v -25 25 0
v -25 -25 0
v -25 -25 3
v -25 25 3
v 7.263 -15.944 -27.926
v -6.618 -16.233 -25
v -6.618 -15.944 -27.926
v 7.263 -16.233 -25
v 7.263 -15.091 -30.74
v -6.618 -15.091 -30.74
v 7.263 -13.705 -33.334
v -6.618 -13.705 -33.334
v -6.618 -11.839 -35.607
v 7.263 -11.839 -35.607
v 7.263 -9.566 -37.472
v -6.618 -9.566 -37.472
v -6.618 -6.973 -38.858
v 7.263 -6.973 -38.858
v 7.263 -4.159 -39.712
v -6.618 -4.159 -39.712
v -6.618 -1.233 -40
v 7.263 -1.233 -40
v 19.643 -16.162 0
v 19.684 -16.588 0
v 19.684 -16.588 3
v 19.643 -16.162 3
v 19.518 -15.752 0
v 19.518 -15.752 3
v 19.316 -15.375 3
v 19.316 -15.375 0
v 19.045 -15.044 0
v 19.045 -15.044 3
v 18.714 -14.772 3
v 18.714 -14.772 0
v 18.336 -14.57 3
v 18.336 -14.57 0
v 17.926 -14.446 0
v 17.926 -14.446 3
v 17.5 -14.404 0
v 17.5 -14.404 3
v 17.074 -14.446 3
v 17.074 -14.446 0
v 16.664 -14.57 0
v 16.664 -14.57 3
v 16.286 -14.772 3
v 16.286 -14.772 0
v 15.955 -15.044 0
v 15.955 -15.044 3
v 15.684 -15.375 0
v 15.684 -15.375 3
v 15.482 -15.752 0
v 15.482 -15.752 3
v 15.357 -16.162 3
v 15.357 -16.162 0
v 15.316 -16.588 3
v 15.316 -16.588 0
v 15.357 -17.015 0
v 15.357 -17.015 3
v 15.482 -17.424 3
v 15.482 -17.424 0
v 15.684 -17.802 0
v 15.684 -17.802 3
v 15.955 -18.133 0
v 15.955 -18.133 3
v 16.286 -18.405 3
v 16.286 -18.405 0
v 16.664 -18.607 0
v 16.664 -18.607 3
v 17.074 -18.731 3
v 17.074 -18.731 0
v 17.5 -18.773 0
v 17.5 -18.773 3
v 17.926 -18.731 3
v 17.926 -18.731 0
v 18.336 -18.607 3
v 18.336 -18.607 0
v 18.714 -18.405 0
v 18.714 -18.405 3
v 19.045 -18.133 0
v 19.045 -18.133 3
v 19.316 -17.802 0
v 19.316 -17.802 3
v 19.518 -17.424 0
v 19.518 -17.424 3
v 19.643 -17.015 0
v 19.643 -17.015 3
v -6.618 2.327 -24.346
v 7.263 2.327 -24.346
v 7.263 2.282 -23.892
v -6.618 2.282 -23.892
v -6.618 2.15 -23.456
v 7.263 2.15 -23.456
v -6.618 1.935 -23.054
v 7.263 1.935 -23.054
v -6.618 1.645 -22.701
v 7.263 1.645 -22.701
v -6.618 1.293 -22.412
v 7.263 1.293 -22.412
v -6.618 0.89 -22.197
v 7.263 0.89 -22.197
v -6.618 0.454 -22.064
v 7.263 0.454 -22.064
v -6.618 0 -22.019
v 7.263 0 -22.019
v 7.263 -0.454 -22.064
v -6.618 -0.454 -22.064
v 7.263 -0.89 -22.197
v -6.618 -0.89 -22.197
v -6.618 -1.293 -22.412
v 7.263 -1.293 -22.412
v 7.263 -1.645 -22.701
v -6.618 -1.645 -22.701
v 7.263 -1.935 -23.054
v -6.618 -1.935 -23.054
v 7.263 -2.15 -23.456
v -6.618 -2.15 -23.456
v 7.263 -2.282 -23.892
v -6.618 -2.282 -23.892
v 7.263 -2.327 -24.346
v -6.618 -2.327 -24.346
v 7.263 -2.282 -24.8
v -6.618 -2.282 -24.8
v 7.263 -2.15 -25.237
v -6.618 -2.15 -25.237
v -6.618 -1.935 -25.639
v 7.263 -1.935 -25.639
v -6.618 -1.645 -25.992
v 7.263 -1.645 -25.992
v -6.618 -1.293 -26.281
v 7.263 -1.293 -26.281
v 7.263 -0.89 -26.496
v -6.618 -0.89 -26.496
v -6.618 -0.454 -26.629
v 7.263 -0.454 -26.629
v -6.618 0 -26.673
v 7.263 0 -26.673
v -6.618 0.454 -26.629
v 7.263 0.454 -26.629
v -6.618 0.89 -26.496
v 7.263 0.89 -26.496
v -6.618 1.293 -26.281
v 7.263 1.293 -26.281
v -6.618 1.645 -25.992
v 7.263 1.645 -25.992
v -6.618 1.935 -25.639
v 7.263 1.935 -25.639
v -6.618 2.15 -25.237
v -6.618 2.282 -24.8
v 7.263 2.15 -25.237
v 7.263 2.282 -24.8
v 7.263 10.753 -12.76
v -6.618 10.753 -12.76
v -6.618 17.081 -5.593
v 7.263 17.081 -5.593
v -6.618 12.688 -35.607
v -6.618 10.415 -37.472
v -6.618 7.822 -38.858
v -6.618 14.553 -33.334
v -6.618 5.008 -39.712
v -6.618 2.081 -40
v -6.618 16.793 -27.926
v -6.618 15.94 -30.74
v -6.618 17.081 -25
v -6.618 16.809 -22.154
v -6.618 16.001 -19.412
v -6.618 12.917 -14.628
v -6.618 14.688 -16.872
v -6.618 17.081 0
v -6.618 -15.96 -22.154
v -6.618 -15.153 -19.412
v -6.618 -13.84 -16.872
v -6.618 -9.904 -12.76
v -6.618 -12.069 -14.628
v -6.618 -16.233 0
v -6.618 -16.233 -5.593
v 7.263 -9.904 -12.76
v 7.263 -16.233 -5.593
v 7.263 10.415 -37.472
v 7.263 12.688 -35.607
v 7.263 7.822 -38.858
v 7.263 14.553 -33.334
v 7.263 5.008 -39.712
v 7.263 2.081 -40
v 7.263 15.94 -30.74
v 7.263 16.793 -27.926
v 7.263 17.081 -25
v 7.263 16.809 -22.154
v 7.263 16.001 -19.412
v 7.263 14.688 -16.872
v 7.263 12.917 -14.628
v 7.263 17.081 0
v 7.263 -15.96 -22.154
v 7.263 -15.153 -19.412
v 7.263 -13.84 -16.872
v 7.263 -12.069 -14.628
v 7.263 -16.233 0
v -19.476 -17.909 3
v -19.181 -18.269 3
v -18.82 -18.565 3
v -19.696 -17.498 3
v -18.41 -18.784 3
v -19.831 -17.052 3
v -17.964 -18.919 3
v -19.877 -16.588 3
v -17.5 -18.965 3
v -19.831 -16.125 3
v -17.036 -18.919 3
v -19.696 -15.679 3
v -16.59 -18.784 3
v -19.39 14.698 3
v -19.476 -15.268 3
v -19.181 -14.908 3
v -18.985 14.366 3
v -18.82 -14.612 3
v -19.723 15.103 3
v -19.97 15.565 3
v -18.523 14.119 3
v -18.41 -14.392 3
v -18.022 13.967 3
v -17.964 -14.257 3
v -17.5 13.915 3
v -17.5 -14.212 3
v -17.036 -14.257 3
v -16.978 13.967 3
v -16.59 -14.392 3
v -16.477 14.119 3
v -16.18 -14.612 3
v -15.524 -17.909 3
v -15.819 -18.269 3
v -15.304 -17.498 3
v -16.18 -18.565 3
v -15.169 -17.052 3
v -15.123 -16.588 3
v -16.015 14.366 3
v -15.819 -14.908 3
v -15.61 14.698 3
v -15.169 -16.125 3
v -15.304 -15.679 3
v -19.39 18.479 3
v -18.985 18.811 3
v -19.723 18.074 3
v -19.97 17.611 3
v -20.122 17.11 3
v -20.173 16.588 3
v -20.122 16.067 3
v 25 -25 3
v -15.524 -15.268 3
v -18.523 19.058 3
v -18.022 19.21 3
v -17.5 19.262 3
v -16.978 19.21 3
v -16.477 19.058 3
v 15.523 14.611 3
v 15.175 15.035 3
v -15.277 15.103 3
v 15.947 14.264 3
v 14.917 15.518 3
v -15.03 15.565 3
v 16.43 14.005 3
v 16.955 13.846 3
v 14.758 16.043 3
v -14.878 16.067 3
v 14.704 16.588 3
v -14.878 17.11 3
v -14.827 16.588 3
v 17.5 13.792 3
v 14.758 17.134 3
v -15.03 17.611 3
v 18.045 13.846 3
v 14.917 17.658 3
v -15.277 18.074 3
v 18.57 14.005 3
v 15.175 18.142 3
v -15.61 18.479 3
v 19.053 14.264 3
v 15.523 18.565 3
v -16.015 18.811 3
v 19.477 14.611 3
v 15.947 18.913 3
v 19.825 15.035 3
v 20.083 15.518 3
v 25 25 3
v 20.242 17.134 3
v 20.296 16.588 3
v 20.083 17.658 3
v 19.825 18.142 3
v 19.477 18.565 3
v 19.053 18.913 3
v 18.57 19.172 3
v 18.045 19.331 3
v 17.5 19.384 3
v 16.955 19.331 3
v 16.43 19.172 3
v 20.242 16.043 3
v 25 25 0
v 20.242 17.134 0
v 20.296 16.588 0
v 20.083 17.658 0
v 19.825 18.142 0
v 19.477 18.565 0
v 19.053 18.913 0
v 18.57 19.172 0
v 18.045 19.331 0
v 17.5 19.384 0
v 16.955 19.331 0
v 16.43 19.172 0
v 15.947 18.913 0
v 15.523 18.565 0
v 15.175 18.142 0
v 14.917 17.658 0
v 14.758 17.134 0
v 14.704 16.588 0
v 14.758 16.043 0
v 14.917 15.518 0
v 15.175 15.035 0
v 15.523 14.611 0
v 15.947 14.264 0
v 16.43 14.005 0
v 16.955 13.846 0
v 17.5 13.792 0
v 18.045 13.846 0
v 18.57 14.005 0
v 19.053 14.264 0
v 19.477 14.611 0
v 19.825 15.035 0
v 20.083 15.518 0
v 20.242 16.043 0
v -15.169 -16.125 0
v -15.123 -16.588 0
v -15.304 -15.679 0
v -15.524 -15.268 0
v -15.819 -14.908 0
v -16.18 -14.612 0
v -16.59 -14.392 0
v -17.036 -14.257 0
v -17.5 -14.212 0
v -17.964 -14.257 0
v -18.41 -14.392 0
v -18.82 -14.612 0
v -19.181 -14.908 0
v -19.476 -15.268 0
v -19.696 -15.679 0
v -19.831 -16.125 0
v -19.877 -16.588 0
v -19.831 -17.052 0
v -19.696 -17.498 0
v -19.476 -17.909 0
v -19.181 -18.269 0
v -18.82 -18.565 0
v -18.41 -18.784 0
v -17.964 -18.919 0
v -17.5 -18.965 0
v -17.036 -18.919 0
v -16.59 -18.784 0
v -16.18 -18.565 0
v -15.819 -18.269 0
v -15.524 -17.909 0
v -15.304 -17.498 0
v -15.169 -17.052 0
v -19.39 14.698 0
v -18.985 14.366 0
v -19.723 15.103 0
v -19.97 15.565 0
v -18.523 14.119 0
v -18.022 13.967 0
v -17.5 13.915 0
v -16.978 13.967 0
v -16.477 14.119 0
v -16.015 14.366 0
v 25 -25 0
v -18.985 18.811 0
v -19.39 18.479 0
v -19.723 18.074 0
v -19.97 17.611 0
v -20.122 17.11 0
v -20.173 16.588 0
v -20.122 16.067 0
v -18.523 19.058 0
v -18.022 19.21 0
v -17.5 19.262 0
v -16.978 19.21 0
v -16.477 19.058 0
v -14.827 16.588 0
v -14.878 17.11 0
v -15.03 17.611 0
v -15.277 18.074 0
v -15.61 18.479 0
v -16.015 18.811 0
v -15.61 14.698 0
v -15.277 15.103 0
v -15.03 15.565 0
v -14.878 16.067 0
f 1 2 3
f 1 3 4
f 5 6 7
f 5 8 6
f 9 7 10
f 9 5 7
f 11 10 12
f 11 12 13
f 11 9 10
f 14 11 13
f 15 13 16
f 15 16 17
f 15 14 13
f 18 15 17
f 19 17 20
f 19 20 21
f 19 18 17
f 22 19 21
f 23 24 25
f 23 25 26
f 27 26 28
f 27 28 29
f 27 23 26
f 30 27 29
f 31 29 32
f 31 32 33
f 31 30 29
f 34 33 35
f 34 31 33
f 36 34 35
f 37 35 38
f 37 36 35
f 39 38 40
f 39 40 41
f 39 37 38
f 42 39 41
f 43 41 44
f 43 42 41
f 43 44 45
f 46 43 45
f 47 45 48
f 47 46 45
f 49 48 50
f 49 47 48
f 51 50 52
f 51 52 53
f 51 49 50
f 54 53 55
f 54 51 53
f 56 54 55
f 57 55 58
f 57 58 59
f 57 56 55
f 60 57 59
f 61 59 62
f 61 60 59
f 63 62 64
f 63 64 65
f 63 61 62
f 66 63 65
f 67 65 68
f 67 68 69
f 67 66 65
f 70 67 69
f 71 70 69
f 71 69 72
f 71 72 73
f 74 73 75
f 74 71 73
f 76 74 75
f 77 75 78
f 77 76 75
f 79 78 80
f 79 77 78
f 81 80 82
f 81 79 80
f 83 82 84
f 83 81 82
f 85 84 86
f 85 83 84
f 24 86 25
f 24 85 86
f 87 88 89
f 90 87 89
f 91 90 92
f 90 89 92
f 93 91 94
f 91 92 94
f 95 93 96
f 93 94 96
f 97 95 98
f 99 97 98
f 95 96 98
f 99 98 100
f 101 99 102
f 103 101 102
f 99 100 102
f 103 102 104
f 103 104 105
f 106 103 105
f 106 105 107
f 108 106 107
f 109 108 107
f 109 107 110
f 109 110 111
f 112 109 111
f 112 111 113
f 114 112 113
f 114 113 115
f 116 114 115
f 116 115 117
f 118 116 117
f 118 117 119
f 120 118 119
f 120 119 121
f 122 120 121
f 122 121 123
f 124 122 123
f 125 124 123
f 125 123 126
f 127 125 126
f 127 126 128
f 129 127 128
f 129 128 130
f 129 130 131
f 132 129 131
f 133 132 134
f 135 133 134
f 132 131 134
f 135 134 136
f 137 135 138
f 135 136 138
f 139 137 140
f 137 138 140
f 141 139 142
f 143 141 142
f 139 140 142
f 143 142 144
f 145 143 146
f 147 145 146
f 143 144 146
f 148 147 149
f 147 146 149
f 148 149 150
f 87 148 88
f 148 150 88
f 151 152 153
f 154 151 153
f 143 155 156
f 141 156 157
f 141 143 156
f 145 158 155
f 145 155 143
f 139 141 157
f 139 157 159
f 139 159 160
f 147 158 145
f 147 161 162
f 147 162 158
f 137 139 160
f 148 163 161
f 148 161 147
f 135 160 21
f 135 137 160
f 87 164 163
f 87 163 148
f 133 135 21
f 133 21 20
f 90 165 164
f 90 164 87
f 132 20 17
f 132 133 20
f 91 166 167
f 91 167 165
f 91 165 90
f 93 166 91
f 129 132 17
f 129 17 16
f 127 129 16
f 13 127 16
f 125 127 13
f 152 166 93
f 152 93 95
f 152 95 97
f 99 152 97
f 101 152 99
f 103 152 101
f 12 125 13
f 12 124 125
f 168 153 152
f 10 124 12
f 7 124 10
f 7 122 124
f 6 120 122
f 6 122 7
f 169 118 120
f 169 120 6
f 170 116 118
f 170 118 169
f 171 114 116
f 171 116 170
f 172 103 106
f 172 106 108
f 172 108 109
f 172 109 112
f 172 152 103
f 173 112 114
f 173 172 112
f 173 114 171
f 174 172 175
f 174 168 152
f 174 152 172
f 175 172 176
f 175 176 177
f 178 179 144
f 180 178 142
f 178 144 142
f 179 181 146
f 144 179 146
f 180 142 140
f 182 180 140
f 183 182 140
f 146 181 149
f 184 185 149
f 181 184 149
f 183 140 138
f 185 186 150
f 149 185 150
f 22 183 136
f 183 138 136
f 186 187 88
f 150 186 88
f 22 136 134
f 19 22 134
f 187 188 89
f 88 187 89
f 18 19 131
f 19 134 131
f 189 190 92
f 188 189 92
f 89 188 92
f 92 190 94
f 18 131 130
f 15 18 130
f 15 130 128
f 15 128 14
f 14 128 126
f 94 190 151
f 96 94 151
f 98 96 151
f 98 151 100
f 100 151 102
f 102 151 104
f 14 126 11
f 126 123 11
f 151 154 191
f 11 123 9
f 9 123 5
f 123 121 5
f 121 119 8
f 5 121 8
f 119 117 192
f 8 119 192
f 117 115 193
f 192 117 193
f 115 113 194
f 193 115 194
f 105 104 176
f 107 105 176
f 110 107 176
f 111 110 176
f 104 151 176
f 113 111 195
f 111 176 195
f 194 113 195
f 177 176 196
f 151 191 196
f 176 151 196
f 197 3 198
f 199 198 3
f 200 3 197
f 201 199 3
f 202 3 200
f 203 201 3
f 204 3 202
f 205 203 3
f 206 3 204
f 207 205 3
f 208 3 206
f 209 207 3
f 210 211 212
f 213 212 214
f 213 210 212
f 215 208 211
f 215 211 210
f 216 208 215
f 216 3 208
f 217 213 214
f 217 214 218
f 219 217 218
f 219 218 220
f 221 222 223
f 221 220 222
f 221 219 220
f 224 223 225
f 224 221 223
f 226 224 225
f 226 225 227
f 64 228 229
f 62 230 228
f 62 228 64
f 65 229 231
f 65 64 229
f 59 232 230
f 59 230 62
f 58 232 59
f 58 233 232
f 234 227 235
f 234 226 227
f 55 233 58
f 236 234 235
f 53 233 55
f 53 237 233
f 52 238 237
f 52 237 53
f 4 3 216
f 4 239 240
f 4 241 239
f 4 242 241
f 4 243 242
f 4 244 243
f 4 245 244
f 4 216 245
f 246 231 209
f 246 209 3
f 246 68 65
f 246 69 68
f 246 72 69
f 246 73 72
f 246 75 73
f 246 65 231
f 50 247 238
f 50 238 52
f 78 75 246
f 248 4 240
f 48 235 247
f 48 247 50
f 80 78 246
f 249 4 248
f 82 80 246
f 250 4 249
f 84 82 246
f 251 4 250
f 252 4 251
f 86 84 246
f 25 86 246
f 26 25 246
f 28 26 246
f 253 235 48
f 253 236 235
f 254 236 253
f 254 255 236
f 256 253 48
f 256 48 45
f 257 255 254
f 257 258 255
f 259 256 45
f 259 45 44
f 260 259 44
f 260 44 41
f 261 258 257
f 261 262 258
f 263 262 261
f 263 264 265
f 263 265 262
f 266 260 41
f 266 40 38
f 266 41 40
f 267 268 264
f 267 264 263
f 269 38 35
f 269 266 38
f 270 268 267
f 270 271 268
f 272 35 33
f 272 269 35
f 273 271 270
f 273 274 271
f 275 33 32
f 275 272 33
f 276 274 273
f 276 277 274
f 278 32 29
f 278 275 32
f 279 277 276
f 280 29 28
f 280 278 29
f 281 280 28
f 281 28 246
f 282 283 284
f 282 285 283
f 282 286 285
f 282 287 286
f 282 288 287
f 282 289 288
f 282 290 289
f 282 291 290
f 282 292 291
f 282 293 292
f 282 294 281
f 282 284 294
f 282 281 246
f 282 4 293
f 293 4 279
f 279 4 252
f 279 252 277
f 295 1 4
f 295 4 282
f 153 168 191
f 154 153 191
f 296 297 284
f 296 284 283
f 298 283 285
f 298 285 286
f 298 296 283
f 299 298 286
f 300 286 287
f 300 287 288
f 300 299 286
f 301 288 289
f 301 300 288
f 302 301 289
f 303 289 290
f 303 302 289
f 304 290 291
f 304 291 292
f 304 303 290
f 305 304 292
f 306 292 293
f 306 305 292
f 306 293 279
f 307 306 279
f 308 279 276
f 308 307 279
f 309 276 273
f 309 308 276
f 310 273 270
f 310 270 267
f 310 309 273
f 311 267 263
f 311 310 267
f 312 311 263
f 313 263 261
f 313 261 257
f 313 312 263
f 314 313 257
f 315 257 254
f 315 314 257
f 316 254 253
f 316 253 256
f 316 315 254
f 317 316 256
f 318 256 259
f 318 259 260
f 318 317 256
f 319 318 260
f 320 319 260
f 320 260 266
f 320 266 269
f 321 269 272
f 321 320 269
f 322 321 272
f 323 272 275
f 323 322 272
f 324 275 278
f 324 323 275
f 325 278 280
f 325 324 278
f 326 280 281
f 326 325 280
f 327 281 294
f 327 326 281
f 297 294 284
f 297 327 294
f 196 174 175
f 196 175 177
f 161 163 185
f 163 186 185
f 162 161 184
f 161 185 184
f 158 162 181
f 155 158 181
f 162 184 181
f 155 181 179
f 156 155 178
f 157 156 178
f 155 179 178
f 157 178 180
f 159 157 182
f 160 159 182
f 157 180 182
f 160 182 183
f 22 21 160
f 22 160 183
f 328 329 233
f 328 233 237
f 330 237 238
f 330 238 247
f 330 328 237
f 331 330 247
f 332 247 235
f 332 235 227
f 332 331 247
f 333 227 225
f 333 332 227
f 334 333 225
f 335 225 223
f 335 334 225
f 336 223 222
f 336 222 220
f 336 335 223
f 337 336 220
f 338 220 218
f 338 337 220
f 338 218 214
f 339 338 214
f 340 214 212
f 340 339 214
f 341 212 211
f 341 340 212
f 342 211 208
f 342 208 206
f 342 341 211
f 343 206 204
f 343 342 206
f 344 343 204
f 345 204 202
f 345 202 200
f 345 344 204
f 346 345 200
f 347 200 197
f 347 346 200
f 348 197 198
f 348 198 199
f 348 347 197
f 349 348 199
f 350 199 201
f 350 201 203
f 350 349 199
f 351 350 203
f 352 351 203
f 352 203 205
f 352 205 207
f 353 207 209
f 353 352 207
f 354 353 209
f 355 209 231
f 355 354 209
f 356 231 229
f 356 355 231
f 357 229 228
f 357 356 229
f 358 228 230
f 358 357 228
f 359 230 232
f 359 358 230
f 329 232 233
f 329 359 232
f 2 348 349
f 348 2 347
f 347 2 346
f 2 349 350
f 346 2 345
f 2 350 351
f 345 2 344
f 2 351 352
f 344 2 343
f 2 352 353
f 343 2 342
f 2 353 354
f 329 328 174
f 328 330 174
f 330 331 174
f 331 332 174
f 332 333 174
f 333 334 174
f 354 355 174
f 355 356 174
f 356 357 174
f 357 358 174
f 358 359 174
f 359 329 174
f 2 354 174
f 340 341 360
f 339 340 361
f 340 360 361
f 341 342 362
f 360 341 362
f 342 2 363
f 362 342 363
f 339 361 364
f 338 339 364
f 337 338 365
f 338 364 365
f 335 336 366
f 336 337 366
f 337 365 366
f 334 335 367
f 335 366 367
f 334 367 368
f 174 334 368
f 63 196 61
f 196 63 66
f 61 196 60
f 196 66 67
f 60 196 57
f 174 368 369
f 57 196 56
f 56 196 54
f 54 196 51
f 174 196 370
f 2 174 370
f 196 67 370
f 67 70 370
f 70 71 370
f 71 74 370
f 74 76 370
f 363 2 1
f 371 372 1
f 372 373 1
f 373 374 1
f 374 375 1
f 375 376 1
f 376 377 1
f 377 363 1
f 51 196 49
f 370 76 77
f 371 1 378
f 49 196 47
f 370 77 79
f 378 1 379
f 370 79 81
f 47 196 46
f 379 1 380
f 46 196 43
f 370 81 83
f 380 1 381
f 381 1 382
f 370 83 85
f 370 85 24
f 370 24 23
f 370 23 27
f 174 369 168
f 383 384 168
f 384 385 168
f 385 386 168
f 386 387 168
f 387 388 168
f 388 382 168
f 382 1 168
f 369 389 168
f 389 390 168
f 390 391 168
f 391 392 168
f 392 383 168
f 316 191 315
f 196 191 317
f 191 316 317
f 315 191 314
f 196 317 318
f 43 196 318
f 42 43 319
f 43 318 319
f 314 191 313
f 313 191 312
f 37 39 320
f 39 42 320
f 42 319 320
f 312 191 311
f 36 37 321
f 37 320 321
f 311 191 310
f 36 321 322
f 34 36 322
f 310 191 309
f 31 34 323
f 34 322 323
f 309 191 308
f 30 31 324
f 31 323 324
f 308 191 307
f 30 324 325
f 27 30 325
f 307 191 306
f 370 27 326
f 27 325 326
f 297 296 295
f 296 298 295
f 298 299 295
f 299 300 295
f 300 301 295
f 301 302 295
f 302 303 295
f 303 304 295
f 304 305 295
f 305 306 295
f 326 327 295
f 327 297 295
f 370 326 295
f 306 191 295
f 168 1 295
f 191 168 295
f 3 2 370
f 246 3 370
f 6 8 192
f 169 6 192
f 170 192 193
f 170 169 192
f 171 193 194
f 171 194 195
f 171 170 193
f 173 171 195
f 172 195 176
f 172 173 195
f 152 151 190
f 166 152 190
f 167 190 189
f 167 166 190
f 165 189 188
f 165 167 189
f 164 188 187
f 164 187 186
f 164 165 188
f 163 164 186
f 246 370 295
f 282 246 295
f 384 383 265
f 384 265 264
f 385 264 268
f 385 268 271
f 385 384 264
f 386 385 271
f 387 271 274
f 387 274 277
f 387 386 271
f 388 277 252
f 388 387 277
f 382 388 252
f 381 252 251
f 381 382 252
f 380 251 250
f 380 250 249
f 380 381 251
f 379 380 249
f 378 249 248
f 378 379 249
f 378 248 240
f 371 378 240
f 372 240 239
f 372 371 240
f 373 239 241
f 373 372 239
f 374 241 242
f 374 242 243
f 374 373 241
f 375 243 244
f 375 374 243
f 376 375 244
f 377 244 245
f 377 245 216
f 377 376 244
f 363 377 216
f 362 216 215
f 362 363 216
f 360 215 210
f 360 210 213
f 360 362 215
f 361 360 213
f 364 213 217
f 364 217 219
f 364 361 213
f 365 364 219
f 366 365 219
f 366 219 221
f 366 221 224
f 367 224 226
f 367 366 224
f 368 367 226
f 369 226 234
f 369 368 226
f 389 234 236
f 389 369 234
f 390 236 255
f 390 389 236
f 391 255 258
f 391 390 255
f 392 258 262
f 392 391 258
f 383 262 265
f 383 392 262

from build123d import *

# Parameters (mm, degrees)
SKETCH_W        = 50
SKETCH_H        = 50
SKETCH_R        = 2.673206
SKETCH_R_2      = 2.795993
SKETCH_R_3      = 2.184497
SKETCH_R_4      = 2.376808
PAD_DEPTH       = 3
SKETCH001_W     = 13.880783
SKETCH001_H     = 33.313887
PAD001_DEPTH    = 40
FILLET_R        = 15
POCKET_DEPTH    = 31.618891
SKETCH003_R     = 2.326985
POCKET001_DEPTH = 32.263892


with BuildPart() as part:
    # Sketch → Pad (new body)
    with BuildSketch(Plane.XY):
        Rectangle(SKETCH_W, SKETCH_H)
        with Locations((-17.5, 16.5883488719)):
            Circle(SKETCH_R, mode=Mode.SUBTRACT)
        with Locations((17.5, 16.588348)):
            Circle(SKETCH_R_2, mode=Mode.SUBTRACT)
        with Locations((17.5, -16.5883488719)):
            Circle(SKETCH_R_3, mode=Mode.SUBTRACT)
        with Locations((-17.5, -16.5883488719)):
            Circle(SKETCH_R_4, mode=Mode.SUBTRACT)
    extrude(amount=PAD_DEPTH)

    # Sketch001 (on Face9 of Pad) → Pad001 (join)
    with BuildSketch(Plane(origin=(0, 0, 0), x_dir=(1, 0, 0), z_dir=(0, 0, -1))):
        with Locations((0.3225005, -0.4243995)):
            Rectangle(SKETCH001_W, SKETCH001_H)
    extrude(amount=PAD001_DEPTH)

    # Fillet
    fillet_edges = [part.edges().sort_by_distance(p)[0] for p in [
        (0.3225, -16.232544, -40),
        (0.322501, 17.081343, -40),
    ]]
    fillet(fillet_edges, radius=FILLET_R)

    # Sketch002 (on Face1 of Fillet) → Pocket (cut, through all)
    with BuildSketch(Plane(origin=(-6.617891, 0, 0), x_dir=(0, -1, 0), z_dir=(-1, 0, 0))):
        with BuildLine():
            ThreePointArc((16.232544, -25), (14.5567914087, -18.1105565543), (9.9039532011, -12.7604468028))
            Line((9.9039532011, -12.7604468028), (16.232544, -5.5931115513))
            Line((16.232544, -5.5931115513), (16.232544, -25))
        make_face()
        with BuildLine():
            ThreePointArc((-10.7527522011, -12.7604468028), (-15.4055904087, -18.1105565543), (-17.081343, -25))
            Line((-17.081343, -5.5931115513), (-17.081343, -25))
            Line((-10.7527522011, -12.7604468028), (-17.081343, -5.5931115513))
        make_face()
    extrude(amount=-POCKET_DEPTH, mode=Mode.SUBTRACT)

    # Sketch003 (on Face18 of Pocket) → Pocket001 (cut, through all)
    with BuildSketch(Plane.YZ.offset(7.262892)):
        with Locations((0, -24.346371)):
            Circle(SKETCH003_R)
    extrude(amount=-POCKET001_DEPTH, mode=Mode.SUBTRACT)


solid = part.part
